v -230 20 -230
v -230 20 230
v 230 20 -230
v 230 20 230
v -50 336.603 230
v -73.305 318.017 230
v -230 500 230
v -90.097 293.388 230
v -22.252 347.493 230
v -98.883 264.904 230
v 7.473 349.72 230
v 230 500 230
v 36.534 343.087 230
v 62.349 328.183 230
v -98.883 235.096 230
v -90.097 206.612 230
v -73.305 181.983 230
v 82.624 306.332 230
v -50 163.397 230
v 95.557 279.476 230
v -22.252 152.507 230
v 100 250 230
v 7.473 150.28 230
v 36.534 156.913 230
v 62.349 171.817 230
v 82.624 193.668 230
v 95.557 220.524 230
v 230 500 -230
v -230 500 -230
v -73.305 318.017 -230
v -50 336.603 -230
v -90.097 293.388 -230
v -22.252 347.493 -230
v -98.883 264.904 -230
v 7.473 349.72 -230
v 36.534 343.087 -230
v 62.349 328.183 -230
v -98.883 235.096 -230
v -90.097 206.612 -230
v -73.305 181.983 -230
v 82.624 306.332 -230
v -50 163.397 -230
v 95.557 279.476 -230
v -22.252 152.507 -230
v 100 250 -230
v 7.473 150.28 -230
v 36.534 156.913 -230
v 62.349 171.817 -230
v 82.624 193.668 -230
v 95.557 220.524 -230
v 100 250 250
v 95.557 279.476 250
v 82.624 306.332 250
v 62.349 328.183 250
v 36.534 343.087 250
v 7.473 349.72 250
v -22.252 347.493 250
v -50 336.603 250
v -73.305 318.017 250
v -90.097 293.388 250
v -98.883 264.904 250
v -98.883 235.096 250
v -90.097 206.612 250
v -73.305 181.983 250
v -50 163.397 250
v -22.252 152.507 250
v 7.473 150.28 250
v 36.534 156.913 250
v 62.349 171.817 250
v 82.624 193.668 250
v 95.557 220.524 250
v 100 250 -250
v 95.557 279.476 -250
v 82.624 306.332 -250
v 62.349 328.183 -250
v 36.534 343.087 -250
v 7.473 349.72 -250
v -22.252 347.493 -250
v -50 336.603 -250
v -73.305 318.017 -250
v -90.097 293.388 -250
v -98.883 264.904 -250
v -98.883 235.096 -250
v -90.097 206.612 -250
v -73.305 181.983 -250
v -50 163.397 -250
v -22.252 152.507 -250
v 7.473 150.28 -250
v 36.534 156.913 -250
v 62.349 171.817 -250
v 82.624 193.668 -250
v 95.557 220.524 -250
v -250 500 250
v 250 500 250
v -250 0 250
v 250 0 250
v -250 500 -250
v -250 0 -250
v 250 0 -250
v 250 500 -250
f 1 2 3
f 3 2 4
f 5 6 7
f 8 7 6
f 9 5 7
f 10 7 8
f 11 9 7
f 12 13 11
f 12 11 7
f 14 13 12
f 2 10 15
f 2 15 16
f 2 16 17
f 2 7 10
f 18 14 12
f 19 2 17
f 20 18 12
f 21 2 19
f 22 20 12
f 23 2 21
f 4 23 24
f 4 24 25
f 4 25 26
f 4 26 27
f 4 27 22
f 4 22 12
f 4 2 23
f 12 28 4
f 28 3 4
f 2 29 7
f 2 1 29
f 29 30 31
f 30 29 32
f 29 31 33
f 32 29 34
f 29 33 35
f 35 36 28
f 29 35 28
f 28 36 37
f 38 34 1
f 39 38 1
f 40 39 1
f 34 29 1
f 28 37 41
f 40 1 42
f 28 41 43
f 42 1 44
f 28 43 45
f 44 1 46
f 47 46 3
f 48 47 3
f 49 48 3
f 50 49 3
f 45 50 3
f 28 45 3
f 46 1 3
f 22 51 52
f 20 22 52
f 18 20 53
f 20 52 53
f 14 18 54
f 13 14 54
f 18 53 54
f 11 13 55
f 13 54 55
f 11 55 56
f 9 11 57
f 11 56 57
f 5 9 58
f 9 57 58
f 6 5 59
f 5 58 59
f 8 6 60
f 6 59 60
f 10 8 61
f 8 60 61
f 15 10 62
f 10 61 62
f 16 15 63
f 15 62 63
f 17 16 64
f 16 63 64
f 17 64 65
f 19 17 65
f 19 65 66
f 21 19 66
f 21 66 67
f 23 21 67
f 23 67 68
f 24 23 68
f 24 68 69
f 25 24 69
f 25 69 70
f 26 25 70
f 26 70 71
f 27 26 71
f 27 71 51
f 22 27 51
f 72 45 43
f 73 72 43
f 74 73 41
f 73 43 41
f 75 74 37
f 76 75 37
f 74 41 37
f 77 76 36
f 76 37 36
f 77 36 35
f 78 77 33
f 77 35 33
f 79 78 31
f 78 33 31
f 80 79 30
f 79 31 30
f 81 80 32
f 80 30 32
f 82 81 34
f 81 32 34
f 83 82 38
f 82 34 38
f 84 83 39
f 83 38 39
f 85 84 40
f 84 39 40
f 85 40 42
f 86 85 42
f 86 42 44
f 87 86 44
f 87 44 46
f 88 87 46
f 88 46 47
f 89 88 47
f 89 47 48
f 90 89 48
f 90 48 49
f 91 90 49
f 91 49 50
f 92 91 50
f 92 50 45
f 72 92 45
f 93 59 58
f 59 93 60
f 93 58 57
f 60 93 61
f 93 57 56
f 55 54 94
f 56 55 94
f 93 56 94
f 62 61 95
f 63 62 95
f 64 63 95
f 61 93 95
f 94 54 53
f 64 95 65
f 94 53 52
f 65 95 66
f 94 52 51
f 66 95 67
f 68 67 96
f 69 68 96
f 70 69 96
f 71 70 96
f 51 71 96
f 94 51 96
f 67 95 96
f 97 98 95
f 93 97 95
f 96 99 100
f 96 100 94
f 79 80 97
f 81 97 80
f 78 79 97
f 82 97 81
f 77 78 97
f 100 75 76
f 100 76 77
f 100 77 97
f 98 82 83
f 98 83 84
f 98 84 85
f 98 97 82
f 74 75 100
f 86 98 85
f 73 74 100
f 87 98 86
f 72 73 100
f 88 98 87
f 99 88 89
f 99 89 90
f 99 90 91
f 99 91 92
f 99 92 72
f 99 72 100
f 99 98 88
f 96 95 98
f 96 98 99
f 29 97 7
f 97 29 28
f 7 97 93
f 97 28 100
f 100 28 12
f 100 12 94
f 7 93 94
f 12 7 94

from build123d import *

# Parameters (mm, degrees)
F0_W      = 500
F0_H      = 500
F1_DEPTH  = 500
F2_T      = -20
F3_R      = 100
F4_DEPTH  = 25
F4_FACE_R = 100
F5_DEPTH  = 525.001


with BuildPart() as f1:
    # F0 (on Front) → F1 (new body)
    with BuildSketch(Plane.XZ):
        Rectangle(F0_W, F0_H)
    extrude(amount=-F1_DEPTH)

    # F2
    f2_openings = [f1.faces().sort_by_distance(p)[0] for p in [
        (0, 500, 0),
    ]]
    offset(amount=F2_T, openings=f2_openings)

    # F3 (on face) → F4 (join)
    with BuildSketch(Plane.XY.offset(250)):
        with Locations((0, 250)):
            Circle(F3_R)
    extrude(amount=F4_DEPTH)

    # F4_face (on face) → F5 (cut, through all)
    with BuildSketch(Plane(origin=(0, 250, 275), x_dir=(1, 0, 0), z_dir=(0, 0, 1))):
        Circle(F4_FACE_R)
    extrude(amount=-F5_DEPTH, mode=Mode.SUBTRACT)


solid = f1.part
